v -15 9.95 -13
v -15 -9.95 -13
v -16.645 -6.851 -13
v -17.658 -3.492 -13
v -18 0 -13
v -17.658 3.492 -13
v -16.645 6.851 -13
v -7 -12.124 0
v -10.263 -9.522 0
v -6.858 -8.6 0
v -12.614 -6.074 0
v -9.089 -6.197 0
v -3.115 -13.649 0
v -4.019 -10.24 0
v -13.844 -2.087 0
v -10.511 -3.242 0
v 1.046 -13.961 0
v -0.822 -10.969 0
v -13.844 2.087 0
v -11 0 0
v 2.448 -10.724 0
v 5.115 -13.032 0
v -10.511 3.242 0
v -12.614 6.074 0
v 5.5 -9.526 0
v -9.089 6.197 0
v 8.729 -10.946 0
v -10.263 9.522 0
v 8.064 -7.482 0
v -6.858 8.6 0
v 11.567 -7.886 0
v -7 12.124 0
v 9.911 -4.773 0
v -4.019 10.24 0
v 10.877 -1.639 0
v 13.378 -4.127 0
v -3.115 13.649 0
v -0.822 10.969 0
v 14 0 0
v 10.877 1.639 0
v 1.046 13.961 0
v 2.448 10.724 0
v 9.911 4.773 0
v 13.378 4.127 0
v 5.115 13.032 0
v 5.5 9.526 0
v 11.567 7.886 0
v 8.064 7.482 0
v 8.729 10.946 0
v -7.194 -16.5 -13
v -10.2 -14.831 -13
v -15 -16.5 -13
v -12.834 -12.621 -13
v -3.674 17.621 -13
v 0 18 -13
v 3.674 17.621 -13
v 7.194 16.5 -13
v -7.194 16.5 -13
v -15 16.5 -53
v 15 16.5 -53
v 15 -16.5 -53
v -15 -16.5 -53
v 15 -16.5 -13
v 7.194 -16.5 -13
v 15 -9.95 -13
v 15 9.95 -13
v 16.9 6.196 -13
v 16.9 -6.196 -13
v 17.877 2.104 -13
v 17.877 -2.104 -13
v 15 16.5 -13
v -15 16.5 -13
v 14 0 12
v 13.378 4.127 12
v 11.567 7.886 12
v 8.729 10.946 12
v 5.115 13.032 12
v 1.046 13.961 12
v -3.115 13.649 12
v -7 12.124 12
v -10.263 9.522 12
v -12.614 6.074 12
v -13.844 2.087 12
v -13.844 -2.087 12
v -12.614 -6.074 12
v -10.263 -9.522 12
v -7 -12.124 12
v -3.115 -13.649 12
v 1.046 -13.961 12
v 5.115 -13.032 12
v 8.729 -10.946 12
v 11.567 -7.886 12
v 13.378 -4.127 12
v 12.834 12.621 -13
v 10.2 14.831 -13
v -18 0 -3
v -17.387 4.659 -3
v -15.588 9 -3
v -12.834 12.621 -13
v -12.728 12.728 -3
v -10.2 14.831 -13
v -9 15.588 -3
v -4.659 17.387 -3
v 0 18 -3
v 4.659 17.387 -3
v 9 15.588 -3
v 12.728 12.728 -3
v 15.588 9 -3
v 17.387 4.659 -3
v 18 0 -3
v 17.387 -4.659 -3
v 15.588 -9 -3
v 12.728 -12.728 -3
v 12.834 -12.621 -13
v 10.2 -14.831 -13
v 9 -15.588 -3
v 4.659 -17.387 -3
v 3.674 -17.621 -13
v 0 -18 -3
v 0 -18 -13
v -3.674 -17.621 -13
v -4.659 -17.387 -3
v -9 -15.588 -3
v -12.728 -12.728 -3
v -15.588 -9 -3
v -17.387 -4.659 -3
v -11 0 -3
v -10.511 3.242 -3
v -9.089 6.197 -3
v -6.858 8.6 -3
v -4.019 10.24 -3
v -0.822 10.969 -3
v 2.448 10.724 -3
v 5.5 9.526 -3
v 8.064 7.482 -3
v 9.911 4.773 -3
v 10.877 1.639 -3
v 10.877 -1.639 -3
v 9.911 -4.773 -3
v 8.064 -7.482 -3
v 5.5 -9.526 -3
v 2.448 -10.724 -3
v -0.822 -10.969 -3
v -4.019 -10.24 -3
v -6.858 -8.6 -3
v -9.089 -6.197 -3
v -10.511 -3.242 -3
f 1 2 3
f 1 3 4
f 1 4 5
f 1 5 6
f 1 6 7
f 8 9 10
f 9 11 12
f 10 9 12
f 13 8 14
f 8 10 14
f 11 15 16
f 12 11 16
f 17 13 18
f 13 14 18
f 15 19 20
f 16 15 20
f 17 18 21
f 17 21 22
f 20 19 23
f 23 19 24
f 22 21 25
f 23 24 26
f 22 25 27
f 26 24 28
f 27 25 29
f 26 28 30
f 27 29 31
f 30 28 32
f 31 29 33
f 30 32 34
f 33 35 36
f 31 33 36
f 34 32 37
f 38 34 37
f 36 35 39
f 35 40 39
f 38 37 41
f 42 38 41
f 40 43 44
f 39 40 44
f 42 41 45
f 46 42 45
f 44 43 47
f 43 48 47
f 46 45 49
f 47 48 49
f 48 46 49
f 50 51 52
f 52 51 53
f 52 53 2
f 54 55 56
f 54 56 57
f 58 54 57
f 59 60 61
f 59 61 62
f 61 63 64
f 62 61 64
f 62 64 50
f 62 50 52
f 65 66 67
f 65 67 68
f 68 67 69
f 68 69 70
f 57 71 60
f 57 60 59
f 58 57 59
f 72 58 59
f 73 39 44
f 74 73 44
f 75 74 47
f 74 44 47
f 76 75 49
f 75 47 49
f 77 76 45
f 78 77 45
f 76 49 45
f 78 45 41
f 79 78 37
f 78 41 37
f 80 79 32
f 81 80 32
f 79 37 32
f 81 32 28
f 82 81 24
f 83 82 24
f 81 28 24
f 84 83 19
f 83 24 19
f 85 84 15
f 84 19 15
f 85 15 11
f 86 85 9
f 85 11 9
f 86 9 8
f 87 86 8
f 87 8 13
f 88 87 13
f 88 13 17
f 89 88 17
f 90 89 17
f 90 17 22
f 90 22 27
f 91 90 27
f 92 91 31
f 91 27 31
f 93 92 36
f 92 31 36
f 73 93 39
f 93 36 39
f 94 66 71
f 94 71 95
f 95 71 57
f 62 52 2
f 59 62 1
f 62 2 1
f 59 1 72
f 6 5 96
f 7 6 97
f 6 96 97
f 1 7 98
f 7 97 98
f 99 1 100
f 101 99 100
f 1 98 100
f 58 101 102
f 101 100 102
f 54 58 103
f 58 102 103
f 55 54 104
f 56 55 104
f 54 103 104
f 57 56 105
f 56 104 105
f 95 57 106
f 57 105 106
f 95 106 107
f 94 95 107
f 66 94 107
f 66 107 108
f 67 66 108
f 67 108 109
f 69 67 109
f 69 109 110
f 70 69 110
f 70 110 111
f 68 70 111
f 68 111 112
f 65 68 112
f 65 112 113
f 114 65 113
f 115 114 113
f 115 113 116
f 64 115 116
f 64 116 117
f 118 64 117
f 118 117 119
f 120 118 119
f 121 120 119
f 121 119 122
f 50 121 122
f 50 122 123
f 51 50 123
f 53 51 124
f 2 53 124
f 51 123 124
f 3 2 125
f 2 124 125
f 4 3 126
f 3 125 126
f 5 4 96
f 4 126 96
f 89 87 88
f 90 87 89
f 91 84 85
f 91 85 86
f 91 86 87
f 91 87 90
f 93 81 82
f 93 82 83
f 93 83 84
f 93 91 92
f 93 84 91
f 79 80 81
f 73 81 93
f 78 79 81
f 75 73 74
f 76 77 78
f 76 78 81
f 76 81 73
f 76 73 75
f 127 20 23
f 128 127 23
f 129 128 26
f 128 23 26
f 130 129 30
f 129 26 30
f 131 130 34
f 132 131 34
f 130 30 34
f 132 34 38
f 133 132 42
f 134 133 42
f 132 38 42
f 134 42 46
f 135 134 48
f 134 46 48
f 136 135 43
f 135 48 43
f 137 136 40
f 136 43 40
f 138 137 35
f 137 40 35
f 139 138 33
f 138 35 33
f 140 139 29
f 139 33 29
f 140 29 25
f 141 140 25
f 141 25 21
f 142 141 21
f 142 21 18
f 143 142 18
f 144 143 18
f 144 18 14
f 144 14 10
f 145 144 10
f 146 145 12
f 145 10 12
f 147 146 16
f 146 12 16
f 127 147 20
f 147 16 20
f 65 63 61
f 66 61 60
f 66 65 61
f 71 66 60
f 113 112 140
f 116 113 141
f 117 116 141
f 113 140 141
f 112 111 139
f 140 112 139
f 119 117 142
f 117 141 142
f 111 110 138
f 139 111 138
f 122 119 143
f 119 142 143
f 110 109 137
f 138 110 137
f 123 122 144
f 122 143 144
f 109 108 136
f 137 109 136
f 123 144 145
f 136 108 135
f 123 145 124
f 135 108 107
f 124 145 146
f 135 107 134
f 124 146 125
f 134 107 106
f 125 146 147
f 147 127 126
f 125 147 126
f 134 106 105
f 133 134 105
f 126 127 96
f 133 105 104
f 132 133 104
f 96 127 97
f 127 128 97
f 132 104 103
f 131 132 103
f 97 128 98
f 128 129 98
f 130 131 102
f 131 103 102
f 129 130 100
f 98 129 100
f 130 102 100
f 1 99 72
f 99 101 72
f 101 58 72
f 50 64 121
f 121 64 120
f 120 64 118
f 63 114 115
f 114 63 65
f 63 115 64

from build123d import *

# Parameters (mm, degrees)
SKETCH_1_R      = 14
EXTRUDE_1_DEPTH = 12
SKETCH_2_R      = 11
EXTRUDE_2_DEPTH = 3
SKETCH_3_R      = 18
EXTRUDE_3_DEPTH = 10
SKETCH_4_W      = 30
SKETCH_4_H      = 33
EXTRUDE_4_DEPTH = 40


with BuildPart() as part:
    # 草图1 → 凸台-拉伸1 (new body)
    with BuildSketch(Plane.XY):
        Circle(SKETCH_1_R)
    extrude(amount=EXTRUDE_1_DEPTH)

    # 草图2 → 凸台-拉伸2 (add)
    with BuildSketch(Plane(origin=(0, 0, 0), x_dir=(-1, 0, 0), z_dir=(0, 0, -1))):
        Circle(SKETCH_2_R)
    extrude(amount=EXTRUDE_2_DEPTH)

    # 草图3 → 凸台-拉伸3 (add)
    with BuildSketch(Plane(origin=(0, 0, -3), x_dir=(-1, 0, 0), z_dir=(0, 0, -1))):
        Circle(SKETCH_3_R)
    extrude(amount=EXTRUDE_3_DEPTH)

    # 草图4 → 凸台-拉伸4 (add)
    with BuildSketch(Plane(origin=(0, 0, -13), x_dir=(-1, 0, 0), z_dir=(0, 0, -1))):
        Rectangle(SKETCH_4_W, SKETCH_4_H)
    extrude(amount=EXTRUDE_4_DEPTH)


solid = part.part
